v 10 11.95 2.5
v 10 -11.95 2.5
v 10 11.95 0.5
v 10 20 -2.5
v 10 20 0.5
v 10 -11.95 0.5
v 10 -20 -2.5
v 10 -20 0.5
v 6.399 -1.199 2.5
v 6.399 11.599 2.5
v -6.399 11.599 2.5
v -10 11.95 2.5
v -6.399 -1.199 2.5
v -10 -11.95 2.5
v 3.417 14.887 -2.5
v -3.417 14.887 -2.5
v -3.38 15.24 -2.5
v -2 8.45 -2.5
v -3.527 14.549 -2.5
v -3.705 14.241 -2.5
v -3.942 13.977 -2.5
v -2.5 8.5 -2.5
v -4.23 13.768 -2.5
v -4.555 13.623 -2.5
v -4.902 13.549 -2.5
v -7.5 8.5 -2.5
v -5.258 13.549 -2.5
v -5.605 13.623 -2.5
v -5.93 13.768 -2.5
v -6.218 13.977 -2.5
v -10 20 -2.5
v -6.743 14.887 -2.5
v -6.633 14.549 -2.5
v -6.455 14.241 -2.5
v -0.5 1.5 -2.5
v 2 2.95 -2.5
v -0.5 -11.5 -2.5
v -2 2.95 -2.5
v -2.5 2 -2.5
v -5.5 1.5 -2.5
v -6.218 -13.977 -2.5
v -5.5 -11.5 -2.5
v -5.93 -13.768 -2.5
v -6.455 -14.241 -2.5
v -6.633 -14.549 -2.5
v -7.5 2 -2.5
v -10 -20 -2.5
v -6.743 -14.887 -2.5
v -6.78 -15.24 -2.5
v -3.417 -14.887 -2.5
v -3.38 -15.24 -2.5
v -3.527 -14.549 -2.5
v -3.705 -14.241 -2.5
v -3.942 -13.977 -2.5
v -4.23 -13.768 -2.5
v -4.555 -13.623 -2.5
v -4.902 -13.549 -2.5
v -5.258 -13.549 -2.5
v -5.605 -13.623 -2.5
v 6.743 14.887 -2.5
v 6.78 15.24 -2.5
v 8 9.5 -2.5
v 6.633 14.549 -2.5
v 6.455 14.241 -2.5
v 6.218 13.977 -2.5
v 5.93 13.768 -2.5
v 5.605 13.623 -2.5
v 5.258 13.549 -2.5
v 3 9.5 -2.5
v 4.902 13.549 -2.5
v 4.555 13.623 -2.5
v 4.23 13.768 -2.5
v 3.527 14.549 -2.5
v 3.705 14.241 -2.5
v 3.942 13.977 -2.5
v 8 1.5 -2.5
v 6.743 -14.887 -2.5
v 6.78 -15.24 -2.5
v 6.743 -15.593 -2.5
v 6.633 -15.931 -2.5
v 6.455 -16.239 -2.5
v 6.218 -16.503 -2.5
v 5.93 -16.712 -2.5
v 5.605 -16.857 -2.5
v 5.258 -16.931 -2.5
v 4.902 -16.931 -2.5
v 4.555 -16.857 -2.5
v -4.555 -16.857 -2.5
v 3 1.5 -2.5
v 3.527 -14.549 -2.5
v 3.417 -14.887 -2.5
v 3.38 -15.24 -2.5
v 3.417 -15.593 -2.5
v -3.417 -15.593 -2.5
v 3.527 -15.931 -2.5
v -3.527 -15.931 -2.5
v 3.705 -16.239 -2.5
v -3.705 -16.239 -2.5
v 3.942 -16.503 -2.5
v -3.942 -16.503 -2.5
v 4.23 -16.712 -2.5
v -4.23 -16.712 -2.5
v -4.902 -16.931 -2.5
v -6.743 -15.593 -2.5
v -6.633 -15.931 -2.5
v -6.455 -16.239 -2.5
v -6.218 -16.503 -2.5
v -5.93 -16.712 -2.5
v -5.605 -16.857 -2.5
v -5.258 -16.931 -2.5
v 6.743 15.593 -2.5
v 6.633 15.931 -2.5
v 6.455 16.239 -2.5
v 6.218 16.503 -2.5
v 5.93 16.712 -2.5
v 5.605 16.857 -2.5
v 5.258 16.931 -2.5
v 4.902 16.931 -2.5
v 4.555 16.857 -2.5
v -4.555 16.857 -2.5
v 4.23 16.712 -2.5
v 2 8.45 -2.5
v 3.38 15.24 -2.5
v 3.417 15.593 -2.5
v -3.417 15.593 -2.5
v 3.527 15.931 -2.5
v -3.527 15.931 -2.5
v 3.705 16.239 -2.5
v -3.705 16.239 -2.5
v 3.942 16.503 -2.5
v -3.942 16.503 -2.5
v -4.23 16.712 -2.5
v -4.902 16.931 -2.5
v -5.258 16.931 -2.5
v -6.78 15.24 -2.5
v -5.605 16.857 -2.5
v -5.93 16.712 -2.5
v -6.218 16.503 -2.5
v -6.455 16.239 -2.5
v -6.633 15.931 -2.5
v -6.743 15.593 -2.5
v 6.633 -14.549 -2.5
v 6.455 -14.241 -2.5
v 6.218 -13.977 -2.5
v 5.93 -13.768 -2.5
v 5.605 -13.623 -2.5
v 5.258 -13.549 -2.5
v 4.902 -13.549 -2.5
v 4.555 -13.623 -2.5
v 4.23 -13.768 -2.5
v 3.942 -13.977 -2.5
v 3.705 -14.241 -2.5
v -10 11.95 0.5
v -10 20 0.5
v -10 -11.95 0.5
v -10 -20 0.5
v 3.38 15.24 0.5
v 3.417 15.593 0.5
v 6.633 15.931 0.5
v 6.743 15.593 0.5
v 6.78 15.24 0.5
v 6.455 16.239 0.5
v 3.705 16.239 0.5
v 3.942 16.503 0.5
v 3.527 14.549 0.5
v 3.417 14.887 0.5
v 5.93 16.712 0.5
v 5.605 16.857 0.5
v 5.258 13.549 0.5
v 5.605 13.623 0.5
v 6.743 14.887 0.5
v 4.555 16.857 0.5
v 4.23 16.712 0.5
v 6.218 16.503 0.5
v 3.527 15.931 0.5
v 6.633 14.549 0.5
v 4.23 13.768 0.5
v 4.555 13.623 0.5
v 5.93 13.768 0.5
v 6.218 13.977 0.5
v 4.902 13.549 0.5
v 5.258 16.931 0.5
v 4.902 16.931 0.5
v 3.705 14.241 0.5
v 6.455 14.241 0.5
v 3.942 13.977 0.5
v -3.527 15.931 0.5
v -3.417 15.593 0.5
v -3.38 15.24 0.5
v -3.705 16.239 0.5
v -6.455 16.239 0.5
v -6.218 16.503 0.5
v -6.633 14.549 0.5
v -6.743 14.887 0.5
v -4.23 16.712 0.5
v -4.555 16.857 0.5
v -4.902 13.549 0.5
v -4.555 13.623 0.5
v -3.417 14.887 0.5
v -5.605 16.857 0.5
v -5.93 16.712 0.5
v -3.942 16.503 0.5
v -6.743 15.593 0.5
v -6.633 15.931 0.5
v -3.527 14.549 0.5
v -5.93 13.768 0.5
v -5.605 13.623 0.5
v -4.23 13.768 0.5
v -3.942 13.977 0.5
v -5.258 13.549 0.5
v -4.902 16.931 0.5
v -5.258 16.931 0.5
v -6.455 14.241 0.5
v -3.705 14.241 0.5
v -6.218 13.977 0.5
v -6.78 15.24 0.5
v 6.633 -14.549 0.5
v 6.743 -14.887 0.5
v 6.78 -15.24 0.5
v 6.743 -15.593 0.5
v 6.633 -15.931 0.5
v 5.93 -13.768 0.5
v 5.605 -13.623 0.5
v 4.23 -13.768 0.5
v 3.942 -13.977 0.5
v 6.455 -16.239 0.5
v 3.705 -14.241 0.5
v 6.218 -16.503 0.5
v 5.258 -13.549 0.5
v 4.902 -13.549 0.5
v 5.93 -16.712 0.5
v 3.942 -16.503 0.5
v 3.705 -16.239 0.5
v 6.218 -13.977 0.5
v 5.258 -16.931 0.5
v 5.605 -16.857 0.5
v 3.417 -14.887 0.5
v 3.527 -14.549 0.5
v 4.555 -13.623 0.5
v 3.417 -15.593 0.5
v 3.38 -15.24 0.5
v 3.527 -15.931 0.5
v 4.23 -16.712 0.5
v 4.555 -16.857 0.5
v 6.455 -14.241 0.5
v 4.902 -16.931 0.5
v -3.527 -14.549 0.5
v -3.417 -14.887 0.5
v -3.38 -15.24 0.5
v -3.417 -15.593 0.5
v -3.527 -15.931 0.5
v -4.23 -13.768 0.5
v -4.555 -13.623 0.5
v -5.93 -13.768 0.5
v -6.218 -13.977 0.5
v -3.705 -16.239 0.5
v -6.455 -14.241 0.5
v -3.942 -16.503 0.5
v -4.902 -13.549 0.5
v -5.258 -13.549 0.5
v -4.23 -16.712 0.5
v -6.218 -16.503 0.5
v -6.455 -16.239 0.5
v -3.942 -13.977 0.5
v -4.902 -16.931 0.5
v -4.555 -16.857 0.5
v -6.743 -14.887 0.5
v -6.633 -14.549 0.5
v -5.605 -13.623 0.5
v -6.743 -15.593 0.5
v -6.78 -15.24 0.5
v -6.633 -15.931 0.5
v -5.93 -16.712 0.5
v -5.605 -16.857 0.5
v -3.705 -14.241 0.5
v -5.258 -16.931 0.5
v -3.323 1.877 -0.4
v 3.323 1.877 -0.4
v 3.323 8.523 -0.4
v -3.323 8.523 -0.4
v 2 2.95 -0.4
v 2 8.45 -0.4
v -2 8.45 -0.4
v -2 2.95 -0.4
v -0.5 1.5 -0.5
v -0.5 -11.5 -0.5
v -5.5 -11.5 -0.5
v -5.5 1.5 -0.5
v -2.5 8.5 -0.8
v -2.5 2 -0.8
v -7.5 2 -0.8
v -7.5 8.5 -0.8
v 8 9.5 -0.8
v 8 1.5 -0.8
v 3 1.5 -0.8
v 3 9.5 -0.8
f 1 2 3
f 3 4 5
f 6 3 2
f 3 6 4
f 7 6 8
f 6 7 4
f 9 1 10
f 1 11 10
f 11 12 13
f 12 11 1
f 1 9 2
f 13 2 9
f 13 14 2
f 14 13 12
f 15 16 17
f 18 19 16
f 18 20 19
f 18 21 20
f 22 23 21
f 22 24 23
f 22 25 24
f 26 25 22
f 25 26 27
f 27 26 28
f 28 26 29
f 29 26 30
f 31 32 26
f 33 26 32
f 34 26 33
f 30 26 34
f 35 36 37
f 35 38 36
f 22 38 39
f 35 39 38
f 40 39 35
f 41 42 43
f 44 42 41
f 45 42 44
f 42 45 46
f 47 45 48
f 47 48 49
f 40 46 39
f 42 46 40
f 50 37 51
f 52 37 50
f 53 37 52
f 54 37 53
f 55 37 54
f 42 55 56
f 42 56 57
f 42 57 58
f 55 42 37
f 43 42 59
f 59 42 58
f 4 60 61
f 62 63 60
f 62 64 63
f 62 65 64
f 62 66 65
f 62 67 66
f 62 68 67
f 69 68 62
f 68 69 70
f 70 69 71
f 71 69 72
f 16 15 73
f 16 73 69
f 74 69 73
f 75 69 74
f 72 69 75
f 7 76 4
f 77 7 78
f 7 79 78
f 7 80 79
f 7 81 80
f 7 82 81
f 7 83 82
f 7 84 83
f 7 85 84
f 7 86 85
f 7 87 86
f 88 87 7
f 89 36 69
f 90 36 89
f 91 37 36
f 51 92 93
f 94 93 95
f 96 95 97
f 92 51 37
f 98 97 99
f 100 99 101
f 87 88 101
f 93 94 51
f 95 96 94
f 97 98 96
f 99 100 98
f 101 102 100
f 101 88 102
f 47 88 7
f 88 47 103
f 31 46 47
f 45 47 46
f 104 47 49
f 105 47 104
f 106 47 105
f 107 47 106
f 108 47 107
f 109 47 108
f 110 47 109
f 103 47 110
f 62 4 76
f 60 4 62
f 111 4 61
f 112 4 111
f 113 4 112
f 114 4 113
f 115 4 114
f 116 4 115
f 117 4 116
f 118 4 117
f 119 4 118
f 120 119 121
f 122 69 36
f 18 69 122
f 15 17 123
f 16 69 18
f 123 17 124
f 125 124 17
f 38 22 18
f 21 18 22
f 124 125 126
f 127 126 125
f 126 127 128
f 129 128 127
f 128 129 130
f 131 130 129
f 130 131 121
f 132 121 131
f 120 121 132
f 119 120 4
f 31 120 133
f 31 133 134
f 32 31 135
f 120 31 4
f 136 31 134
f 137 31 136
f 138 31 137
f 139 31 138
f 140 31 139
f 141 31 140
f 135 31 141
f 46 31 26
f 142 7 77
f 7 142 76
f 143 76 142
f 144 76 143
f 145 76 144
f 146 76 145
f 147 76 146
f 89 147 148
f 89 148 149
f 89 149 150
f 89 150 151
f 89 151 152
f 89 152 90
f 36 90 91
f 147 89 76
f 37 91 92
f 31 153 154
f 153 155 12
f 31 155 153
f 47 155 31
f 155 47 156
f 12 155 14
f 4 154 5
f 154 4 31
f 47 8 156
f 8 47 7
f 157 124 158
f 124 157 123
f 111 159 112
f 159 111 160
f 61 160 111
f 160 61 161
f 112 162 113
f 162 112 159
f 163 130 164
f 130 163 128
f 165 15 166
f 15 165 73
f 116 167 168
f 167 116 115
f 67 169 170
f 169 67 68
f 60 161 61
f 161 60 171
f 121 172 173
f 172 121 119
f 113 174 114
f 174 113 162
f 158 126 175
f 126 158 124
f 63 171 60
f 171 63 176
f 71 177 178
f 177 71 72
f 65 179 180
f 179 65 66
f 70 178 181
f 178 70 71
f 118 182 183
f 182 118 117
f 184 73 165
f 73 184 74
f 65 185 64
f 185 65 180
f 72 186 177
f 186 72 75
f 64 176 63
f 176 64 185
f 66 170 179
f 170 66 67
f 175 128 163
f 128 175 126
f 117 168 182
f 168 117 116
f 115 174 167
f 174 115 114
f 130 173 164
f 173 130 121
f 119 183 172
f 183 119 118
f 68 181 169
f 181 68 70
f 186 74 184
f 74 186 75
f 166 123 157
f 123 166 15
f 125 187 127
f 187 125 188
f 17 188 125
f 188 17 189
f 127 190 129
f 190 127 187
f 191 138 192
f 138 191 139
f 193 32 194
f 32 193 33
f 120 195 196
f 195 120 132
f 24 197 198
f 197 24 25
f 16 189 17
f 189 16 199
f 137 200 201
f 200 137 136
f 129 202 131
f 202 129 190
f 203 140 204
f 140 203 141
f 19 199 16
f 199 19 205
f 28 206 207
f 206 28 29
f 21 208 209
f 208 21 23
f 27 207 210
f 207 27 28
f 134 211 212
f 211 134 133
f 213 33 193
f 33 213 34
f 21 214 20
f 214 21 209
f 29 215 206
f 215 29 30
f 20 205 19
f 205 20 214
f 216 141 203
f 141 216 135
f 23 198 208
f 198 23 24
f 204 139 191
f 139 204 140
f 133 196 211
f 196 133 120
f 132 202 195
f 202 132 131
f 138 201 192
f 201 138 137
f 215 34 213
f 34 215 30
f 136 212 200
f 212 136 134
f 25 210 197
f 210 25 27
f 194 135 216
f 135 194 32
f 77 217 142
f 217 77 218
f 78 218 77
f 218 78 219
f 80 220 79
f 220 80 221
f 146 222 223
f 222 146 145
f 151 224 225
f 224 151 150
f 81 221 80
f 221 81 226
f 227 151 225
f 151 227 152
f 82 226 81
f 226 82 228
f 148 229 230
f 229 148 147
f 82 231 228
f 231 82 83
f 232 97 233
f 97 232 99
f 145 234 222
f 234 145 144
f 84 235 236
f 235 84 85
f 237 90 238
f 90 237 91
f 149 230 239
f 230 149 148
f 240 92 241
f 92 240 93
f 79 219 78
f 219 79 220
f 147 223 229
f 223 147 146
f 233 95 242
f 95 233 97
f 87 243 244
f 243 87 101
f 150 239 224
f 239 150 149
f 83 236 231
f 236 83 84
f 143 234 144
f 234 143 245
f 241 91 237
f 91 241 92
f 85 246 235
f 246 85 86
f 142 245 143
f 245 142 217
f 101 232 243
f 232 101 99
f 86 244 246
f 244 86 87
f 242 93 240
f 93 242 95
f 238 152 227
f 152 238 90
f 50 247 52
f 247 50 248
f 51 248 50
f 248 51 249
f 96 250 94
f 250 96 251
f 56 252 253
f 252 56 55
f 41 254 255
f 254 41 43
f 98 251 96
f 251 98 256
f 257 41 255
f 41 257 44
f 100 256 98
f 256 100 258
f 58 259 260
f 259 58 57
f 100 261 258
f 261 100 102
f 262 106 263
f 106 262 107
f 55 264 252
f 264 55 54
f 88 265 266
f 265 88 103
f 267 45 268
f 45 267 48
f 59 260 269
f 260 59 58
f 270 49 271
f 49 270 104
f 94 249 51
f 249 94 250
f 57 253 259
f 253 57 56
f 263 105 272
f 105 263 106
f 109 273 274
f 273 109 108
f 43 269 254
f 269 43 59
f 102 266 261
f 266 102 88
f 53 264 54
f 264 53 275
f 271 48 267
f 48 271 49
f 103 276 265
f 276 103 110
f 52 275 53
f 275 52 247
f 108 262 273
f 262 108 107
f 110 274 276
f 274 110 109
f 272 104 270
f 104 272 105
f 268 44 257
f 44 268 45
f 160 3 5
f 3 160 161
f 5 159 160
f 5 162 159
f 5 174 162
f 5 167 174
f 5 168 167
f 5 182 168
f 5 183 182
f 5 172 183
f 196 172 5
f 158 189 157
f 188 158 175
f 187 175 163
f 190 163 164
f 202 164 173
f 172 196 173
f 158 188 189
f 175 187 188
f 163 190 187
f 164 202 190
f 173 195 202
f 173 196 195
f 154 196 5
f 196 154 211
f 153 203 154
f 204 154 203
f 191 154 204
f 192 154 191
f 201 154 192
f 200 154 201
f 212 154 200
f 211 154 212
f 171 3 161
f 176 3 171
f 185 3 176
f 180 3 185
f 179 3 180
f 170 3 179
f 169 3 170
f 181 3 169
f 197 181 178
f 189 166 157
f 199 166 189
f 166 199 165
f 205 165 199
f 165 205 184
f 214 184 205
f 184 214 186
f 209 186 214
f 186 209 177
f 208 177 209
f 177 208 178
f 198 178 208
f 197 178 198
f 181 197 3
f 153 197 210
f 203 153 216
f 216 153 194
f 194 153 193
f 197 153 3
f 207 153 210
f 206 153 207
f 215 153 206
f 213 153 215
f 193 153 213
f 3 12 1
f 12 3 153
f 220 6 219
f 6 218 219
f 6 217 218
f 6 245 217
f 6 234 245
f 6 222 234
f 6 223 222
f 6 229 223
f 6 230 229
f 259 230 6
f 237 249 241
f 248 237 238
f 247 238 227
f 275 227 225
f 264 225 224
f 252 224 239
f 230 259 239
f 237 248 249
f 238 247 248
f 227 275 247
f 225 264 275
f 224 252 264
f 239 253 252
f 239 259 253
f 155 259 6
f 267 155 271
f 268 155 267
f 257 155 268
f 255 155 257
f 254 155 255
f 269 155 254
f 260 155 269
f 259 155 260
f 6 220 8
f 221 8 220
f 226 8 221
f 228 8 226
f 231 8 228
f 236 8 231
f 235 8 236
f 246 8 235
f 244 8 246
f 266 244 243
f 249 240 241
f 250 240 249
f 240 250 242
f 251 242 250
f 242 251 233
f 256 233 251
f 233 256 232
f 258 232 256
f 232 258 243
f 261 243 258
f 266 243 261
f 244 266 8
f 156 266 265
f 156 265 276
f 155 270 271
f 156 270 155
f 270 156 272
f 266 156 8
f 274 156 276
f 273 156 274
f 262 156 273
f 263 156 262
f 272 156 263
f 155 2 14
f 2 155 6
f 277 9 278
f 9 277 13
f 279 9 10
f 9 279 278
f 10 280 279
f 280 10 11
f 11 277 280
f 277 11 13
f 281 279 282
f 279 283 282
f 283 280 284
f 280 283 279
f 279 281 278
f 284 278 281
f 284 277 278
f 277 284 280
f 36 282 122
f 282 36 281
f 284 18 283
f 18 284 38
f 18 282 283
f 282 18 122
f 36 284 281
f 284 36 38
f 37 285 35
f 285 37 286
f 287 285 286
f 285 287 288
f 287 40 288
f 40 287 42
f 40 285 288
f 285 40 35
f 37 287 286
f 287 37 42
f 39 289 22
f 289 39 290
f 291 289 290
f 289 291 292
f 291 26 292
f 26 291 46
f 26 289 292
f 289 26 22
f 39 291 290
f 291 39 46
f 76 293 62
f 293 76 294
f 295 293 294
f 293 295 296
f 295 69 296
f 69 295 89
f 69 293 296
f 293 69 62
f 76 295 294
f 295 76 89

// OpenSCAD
$fn = 30;
difference(){
    cube([20, 40, 5], center = true);
    
    /// rohove diry
        translate([5.08, 15.24, 0]){
            cylinder(16, 3/2+0.2, 3/2+0.2, center = true);
        }
        translate([-5.08, 15.24, 0]){
            cylinder(16,3/2+0.2, 3/2+0.2, center = true);
        }    
        translate([5.08, -15.24, 0]){
            cylinder(16, 3/2+0.2, 3/2+0.2, center = true);
        }   
        translate([-5.08, -15.24, 0]){
            cylinder(16, 3/2+0.2, 3/2+0.2, center = true);
        }
    
    ///     zapusteni pro srouby
    translate([0, 16, 2]){
        cube([21, 8.1, 3], center = true);
    }
    translate([0, -16, 2]){
        cube([21, 8.1, 3], center = true);
    }
     
    /// trychtyr
    translate([0, 5.2, 2.6]){
        rotate([0, 0, 45]){
            cylinder(6, 4.7, 13.7, $fn=4, center = true);
        }
    }
    
    /// zlepseni tesneni v trychtyri
  translate([0, 5.7, -2]){
      cube([4, 5.5, 3.5],center = true);
    }
    
    /// vyber pro komponenty
    
    ///1
    translate([-3, -5, -2]){
        cube([5, 13, 3], center = true);
    }
    
    ///2
    translate([-5, 5.25, -2.3]){
        cube([5, 6.5, 3],center = true);
    }
    ///3
    translate([5.5, 5.5, -2.3]){
        cube([5, 8, 3], center = true);
    }
}
